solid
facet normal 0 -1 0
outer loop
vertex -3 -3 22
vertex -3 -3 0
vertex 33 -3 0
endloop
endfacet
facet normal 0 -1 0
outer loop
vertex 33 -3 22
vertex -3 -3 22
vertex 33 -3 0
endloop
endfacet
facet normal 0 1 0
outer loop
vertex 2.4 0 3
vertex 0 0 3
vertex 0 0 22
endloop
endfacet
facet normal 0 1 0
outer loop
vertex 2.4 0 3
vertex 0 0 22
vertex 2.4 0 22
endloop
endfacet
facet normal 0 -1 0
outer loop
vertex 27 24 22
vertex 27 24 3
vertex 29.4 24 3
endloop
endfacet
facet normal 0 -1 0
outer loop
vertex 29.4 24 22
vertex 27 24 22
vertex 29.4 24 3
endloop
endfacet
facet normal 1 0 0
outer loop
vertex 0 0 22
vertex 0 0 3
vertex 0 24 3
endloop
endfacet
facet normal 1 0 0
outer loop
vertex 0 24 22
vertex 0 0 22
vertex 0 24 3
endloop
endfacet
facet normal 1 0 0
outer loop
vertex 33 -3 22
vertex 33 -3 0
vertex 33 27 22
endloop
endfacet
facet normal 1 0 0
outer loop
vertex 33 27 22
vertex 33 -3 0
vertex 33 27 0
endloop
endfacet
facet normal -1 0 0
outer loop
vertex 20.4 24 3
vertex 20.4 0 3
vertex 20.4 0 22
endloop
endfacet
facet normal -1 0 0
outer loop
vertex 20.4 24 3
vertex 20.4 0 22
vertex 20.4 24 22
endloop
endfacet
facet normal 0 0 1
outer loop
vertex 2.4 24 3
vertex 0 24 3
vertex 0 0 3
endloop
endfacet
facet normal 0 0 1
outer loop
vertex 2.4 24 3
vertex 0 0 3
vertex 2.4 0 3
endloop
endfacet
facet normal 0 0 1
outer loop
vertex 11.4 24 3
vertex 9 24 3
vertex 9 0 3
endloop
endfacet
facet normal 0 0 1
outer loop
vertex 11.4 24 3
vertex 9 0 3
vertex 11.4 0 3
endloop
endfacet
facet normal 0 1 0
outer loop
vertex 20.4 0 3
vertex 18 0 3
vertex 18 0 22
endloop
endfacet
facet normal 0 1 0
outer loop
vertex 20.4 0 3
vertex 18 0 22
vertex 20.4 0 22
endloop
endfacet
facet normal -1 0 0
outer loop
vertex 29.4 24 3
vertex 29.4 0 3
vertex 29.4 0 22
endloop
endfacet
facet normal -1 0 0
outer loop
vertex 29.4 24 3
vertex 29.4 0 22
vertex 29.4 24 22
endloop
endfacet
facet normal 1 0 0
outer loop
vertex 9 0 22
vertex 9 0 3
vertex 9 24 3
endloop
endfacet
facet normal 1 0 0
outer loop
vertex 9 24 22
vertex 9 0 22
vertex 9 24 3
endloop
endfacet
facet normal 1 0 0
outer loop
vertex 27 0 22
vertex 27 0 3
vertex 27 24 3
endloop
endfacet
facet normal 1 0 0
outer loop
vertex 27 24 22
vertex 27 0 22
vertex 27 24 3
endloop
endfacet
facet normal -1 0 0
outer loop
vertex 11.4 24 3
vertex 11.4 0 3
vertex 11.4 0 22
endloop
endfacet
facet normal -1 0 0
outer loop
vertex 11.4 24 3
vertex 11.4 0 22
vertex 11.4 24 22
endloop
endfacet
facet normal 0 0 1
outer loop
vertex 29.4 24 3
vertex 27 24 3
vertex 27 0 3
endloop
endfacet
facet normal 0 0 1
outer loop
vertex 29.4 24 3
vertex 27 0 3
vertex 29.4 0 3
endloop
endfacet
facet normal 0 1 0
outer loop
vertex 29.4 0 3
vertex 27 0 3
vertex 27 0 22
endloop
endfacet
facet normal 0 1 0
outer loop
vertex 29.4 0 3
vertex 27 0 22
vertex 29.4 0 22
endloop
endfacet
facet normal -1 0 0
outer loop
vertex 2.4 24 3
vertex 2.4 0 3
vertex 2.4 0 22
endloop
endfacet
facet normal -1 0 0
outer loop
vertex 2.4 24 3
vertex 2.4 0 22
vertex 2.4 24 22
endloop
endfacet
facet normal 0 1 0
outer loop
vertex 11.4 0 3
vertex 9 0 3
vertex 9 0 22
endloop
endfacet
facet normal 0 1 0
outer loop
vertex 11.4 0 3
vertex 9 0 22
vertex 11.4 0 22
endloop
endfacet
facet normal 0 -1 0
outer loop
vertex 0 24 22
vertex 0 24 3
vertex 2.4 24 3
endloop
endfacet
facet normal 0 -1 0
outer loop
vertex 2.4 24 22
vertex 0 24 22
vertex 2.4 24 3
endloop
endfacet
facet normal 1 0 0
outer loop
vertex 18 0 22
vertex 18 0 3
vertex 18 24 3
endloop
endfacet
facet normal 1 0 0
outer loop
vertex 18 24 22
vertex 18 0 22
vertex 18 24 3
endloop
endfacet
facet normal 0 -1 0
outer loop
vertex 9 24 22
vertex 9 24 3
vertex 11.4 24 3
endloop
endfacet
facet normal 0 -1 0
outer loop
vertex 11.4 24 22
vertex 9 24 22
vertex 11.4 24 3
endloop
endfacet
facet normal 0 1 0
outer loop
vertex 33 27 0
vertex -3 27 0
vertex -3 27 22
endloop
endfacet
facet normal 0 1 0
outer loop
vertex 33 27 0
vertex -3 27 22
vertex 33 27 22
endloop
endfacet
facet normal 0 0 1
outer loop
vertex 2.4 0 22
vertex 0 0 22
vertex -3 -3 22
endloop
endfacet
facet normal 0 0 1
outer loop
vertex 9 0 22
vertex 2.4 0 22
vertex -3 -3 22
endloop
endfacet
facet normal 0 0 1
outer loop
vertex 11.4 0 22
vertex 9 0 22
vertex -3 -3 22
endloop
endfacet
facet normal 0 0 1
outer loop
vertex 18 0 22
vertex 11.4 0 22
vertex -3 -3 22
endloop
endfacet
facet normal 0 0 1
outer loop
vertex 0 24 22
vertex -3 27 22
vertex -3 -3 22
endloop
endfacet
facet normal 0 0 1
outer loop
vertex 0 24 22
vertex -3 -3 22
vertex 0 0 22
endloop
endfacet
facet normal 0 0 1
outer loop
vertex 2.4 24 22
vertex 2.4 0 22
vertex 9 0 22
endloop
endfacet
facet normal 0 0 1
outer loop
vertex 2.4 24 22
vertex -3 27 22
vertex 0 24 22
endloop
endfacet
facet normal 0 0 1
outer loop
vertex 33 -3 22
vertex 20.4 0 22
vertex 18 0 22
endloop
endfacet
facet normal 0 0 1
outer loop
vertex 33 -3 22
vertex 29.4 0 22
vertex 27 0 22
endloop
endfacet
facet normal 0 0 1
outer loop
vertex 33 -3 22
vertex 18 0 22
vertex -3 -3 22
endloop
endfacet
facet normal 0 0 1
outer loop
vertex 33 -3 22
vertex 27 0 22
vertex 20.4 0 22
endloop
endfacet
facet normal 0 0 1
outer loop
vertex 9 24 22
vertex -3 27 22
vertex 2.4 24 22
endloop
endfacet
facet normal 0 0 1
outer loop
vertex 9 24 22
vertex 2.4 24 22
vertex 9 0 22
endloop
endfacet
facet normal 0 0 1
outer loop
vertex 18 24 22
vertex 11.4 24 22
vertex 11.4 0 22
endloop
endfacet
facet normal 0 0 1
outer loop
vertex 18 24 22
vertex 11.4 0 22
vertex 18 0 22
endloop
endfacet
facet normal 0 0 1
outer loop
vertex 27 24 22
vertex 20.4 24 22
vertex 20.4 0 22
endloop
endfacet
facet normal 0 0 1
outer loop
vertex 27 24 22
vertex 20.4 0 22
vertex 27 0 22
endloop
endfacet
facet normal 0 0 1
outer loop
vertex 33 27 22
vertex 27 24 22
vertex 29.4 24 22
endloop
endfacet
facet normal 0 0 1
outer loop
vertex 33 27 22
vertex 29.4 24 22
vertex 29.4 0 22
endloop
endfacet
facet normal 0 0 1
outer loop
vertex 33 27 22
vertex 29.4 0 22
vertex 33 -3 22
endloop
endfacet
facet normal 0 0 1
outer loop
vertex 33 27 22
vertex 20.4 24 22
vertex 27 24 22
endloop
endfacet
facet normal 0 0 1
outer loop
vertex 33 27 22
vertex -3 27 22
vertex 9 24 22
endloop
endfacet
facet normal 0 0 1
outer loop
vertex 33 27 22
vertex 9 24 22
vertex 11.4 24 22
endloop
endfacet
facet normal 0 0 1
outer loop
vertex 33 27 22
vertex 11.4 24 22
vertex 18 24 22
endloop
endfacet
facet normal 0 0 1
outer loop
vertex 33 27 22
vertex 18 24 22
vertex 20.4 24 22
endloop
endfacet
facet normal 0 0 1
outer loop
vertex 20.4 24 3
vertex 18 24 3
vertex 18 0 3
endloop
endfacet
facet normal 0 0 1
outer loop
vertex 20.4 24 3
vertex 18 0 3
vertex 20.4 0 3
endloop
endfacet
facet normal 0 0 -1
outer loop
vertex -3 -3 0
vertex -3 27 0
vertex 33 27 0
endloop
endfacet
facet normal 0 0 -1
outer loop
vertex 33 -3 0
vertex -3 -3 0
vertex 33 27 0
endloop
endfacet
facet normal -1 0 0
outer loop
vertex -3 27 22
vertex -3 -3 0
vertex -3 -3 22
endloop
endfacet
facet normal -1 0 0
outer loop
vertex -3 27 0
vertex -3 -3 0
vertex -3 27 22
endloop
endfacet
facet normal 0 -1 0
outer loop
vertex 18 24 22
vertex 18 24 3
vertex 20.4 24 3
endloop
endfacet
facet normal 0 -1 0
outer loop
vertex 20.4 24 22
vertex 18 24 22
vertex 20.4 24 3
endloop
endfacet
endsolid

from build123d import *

# Parameters (mm, degrees)
BOX_W        = 2.4
BOX_H        = 24
BOX_DEPTH    = 22
BOX001_W     = 2.4
BOX001_H     = 24
BOX001_DEPTH = 22
BOX002_W     = 2.4
BOX002_H     = 24
BOX002_DEPTH = 22
BOX003_W     = 2.4
BOX003_H     = 24
BOX003_DEPTH = 22
BOX004_W     = 36
BOX004_H     = 30
BOX004_DEPTH = 22


with BuildPart() as box:
    # Box → Box (new body)
    with BuildSketch(Plane.XY):
        with Locations((1.2, 12)):
            Rectangle(BOX_W, BOX_H)
    extrude(amount=BOX_DEPTH)


with BuildPart() as box001:
    # Box001 → Box001 (new body)
    with BuildSketch(Plane(origin=(9, 0, 0), x_dir=(1, 0, 0), z_dir=(0, 0, 1))):
        with Locations((1.2, 12)):
            Rectangle(BOX001_W, BOX001_H)
    extrude(amount=BOX001_DEPTH)


with BuildPart() as box002:
    # Box002 → Box002 (new body)
    with BuildSketch(Plane(origin=(18, 0, 0), x_dir=(1, 0, 0), z_dir=(0, 0, 1))):
        with Locations((1.2, 12)):
            Rectangle(BOX002_W, BOX002_H)
    extrude(amount=BOX002_DEPTH)


with BuildPart() as ranuras:
    # Box003 → Box003 (new body)
    with BuildSketch(Plane(origin=(27, 0, 0), x_dir=(1, 0, 0), z_dir=(0, 0, 1))):
        with Locations((1.2, 12)):
            Rectangle(BOX003_W, BOX003_H)
    extrude(amount=BOX003_DEPTH)

    # Fusion: union Box, Box001, Box002
    add(box.part)
    add(box001.part)
    add(box002.part)


with BuildPart() as ranuras_1:
    # Fusion placement: moved
    add(ranuras.part.moved(Location((0, 0, 3))))


with BuildPart() as cut:
    # Box004 → Box004 (new body)
    with BuildSketch(Plane(origin=(-3, -3, 0), x_dir=(1, 0, 0), z_dir=(0, 0, 1))):
        with Locations((18, 15)):
            Rectangle(BOX004_W, BOX004_H)
    extrude(amount=BOX004_DEPTH)

    # Cut: cut Ranuras
    add(ranuras_1.part, mode=Mode.SUBTRACT)


solid = cut.part
